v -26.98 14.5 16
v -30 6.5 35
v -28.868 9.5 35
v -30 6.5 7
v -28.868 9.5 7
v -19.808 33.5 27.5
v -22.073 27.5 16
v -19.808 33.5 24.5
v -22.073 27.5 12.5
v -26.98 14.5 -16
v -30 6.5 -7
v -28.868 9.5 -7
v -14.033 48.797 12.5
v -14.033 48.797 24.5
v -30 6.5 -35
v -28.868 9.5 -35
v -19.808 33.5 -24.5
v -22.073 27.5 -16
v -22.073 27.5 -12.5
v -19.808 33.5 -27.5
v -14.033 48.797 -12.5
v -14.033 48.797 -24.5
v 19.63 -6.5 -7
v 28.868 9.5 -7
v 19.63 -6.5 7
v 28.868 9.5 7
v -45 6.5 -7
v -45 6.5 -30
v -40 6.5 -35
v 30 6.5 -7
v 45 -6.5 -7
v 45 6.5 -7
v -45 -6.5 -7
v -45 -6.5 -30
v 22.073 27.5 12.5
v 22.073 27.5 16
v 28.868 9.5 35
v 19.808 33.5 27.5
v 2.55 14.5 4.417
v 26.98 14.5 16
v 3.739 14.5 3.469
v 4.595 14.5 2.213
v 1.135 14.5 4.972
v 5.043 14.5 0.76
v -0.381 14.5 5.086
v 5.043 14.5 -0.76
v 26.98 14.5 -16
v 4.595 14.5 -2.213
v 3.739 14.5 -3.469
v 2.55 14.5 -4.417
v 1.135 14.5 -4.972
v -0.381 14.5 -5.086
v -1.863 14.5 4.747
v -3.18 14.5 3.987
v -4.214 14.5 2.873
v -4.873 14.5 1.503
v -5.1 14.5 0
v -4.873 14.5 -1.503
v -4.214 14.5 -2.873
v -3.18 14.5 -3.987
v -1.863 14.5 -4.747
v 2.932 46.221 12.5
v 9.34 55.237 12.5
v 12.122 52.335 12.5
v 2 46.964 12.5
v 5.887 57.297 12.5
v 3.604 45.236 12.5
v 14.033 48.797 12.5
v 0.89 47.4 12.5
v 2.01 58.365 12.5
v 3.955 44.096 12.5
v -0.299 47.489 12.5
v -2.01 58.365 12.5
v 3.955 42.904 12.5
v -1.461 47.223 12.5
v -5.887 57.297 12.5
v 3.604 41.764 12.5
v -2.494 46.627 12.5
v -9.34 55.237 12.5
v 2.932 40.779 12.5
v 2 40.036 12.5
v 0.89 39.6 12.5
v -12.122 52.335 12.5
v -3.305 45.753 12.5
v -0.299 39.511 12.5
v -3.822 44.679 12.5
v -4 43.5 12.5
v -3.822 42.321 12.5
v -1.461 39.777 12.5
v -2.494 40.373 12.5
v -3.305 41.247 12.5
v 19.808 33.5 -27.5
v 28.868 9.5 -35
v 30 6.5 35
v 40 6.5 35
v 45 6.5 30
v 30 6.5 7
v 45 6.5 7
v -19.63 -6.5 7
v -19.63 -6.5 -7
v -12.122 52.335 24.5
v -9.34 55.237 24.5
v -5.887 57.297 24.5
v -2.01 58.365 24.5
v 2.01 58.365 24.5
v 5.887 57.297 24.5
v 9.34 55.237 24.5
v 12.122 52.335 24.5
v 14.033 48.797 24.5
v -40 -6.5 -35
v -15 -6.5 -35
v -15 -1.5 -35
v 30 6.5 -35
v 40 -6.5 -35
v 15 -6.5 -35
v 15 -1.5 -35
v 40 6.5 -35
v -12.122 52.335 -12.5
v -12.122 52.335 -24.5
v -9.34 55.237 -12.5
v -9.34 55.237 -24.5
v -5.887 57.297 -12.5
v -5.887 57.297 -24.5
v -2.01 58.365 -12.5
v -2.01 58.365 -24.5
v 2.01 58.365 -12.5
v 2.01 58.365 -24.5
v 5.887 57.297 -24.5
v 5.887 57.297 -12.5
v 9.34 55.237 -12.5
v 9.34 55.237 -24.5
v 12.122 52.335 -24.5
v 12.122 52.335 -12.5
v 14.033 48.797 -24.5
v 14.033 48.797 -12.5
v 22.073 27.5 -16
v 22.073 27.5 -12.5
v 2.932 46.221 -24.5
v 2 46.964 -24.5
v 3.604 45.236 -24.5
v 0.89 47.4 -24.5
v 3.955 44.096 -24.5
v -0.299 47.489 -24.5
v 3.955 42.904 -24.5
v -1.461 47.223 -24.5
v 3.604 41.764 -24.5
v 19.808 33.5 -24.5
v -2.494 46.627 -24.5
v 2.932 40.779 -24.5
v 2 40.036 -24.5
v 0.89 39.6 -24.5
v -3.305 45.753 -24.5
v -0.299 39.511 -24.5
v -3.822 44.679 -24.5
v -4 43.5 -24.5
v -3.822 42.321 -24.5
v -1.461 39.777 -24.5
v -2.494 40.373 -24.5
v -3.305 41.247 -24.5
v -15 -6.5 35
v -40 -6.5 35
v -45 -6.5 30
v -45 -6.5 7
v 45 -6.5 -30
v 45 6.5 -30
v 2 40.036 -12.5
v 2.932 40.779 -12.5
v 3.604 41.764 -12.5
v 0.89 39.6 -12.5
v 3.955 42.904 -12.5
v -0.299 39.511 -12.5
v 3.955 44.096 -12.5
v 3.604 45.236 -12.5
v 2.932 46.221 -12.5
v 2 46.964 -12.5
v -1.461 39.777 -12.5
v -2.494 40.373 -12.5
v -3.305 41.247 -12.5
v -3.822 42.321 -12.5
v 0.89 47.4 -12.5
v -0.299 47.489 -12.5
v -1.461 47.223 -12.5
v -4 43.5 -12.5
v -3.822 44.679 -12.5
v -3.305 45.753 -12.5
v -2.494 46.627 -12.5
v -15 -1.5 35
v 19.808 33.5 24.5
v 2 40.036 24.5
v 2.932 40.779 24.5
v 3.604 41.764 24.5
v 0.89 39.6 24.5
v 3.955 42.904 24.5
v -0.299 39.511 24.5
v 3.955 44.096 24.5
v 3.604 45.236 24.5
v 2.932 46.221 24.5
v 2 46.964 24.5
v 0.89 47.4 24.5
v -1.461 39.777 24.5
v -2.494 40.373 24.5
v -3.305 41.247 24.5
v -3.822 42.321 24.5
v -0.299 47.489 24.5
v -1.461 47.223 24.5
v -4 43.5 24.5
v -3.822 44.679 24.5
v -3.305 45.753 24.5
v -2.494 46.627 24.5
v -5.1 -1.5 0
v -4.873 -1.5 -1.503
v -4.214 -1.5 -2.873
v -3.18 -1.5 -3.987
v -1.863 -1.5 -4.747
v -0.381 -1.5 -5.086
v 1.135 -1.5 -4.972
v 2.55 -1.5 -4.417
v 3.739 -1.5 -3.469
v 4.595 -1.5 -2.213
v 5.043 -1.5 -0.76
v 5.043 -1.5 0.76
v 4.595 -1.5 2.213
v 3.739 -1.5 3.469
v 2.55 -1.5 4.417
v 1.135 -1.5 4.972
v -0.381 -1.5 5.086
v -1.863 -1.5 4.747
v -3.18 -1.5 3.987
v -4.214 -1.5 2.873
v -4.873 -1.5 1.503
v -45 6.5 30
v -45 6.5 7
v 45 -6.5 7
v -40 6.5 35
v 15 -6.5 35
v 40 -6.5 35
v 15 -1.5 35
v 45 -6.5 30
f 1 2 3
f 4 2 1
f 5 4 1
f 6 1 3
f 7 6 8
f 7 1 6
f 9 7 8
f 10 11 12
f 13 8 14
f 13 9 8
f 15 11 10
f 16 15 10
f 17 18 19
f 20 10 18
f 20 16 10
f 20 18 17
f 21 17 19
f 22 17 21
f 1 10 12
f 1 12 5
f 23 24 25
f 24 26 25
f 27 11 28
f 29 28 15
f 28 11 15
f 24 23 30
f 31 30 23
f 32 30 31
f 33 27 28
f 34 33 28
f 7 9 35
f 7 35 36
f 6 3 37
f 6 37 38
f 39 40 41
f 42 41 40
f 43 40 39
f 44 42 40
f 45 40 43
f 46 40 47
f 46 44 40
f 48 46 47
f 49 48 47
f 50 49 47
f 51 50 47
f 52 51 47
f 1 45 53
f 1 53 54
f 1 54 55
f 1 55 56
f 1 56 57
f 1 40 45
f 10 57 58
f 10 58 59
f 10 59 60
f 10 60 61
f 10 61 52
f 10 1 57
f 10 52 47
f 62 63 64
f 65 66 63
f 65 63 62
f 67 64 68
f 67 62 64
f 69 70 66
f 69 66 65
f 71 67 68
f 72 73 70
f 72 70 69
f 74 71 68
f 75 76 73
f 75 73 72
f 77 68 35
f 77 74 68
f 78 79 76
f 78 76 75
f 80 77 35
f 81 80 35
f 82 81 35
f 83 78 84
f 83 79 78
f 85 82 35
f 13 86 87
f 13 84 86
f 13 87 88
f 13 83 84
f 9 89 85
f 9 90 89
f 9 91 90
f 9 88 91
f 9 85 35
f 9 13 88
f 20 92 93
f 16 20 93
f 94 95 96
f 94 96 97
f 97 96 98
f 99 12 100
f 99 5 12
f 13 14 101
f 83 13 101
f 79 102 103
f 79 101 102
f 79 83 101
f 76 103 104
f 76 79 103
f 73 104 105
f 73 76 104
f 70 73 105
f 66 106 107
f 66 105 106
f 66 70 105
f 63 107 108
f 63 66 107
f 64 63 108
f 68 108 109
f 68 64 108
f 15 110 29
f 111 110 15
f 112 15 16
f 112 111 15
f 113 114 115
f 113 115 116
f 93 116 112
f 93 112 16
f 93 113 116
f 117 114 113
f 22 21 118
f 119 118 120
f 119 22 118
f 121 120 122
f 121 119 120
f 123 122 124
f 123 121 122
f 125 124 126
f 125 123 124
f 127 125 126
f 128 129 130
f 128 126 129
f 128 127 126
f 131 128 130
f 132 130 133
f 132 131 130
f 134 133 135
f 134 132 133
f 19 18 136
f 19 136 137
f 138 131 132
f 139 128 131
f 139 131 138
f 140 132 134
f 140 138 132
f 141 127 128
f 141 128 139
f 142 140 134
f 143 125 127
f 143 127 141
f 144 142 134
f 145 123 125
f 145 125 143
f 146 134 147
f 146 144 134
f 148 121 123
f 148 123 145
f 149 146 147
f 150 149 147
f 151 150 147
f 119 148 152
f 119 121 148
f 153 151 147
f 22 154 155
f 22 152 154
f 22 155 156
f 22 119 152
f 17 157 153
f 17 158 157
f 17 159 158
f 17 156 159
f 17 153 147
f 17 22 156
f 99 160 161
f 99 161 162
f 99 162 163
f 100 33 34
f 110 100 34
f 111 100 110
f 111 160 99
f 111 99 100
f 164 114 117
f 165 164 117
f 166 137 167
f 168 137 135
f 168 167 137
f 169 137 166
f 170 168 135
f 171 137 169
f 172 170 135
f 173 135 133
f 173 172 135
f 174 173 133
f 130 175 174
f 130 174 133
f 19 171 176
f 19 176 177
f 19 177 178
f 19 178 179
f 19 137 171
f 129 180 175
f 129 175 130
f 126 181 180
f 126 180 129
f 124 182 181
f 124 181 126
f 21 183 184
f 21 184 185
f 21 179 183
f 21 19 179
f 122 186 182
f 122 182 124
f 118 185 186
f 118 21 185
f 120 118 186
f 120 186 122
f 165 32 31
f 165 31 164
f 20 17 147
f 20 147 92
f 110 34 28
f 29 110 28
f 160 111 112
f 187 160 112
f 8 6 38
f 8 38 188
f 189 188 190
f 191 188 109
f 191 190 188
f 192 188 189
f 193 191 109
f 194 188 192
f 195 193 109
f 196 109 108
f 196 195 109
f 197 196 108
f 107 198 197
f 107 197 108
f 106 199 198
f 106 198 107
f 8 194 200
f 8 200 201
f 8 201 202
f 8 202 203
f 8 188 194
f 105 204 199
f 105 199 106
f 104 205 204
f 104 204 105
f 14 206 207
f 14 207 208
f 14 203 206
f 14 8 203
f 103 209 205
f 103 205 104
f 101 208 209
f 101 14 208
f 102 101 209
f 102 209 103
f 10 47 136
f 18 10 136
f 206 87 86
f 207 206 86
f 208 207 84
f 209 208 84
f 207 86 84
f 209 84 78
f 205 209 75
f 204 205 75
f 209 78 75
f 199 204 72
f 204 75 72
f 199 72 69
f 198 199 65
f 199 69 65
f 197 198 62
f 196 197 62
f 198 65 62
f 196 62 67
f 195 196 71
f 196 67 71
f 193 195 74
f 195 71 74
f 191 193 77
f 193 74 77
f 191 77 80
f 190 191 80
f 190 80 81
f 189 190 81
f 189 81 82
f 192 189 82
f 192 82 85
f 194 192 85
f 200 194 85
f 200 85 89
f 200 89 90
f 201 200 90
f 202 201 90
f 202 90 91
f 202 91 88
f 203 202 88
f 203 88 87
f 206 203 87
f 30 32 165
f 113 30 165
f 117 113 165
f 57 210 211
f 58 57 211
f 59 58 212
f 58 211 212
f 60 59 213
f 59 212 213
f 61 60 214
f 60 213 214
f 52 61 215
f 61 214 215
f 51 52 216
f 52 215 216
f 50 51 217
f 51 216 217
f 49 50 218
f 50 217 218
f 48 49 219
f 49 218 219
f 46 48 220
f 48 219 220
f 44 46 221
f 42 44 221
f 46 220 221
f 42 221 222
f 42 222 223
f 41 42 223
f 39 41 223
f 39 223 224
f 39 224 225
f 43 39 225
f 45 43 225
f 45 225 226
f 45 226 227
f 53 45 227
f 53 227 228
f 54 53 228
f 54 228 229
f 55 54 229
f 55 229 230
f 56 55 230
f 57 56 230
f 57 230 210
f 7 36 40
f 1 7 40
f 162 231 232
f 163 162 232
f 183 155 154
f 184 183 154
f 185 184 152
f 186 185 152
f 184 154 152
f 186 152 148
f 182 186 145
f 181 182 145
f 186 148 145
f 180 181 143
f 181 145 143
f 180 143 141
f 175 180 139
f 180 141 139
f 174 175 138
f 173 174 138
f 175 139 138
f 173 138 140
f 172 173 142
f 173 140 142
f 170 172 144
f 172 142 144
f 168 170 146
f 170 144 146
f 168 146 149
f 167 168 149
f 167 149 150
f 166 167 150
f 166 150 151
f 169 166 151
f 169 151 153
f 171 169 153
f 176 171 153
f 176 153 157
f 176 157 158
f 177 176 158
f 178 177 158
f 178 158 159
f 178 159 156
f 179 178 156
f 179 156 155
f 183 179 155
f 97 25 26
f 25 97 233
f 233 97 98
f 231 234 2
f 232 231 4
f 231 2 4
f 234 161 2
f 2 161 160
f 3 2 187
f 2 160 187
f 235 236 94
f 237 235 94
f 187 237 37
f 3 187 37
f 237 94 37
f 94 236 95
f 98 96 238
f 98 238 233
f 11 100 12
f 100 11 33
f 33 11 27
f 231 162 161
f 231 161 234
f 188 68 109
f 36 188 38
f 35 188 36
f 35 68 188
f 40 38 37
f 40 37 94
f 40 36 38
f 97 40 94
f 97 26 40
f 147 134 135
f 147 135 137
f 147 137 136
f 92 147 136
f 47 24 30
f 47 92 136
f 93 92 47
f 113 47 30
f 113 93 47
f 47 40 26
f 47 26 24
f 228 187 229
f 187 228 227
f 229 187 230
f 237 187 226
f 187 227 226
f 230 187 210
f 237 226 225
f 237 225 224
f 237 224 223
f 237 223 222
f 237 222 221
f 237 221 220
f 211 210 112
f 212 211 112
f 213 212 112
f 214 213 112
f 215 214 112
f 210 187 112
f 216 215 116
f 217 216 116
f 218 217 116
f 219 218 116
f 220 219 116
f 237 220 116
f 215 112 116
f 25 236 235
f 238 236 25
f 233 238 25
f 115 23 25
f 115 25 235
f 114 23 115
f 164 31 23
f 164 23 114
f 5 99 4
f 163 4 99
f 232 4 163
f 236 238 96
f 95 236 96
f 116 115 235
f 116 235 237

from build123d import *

# Parameters (mm, degrees)
SKETCH1_W                = 70
SKETCH1_H                = 13
BOSS_EXTRUDE1_DEPTH      = 45
CHAMFER1_SIZE            = 5
CUT_EXTRUDE1_DEPTH       = 58.378131723
CUT_EXTRUDE1_DEPTH_BACK  = 58.378131723
SKETCH3_W                = 30
SKETCH3_H                = 5
BOSS_EXTRUDE2_DEPTH      = 35
BOSS_EXTRUDE2_DEPTH_BACK = 35
CUT_EXTRUDE11_DEPTH      = 82.683841731
CUT_EXTRUDE11_DEPTH_BACK = 82.683841731
CUT_EXTRUDE12_DEPTH      = 7
F_8_0_8_DIAMETER_HOLE2_D = 8
M12_TAPPED_HOLE1_D       = 10.2


with BuildPart() as part:
    # Sketch1 → Boss-Extrude1 (new, symmetric)
    with BuildSketch(Plane(origin=(0, 0, 0), x_dir=(0, 0, -1), z_dir=(1, 0, 0))):
        Rectangle(SKETCH1_W, SKETCH1_H)
    extrude(amount=BOSS_EXTRUDE1_DEPTH, both=True)

    # Chamfer1
    chamfer1_edges = [part.edges().sort_by_distance(p)[0] for p in [
        (45, 0, -35),
        (45, 0, 35),
        (-45, 0, -35),
        (-45, 0, 35),
    ]]
    chamfer(chamfer1_edges, length=CHAMFER1_SIZE)

    # Sketch3 → Cut-Extrude1 (cut, two sides: drawn at the far end of the back side and taken through both)
    with BuildSketch(Plane.XY.offset(-CUT_EXTRUDE1_DEPTH_BACK)):
        with Locations((0, -4)):
            Rectangle(SKETCH3_W, SKETCH3_H)
    extrude(amount=CUT_EXTRUDE1_DEPTH + CUT_EXTRUDE1_DEPTH_BACK, mode=Mode.SUBTRACT)

    # Sketch4 → Boss-Extrude2 (add, two sides: drawn at the far end of the back side and taken through both)
    with BuildSketch(Plane.XY.offset(-BOSS_EXTRUDE2_DEPTH_BACK)):
        with BuildLine():
            Line((-30, 6.5), (-14.033447824, 48.797390128))
            ThreePointArc((-14.033447824, 48.797390128), (0, 58.5), (14.033447824, 48.797390128))
            Line((14.033447824, 48.797390128), (30, 6.5))
            Line((30, 6.5), (-30, 6.5))
        make_face()
    extrude(amount=BOSS_EXTRUDE2_DEPTH + BOSS_EXTRUDE2_DEPTH_BACK)

    # Sketch13 → Cut-Extrude11 (cut, two sides: drawn at the far end of the back side and taken through both)
    with BuildSketch(Plane(origin=(0, 0, 0), x_dir=(0, 0, -1), z_dir=(1, 0, 0)).offset(-CUT_EXTRUDE11_DEPTH_BACK)):
        Polygon((-88.955494026, -163.157580884), (-35, 9.5), (-27.5, 33.5), (-24.5, 33.5), (-24.5, 58.5), (-12.5, 58.5), (-12.5, 27.5), (-16, 27.5), (-16, 14.5), (16, 14.5), (16, 27.5), (12.5, 27.5), (12.5, 58.5), (24.5, 58.5), (24.5, 33.5), (27.5, 33.5), (35, 9.5), (88.955494026, -163.157580884), (88.955494026, 198.625976356), (-88.955494026, 198.625976356), align=None)
    extrude(amount=CUT_EXTRUDE11_DEPTH + CUT_EXTRUDE11_DEPTH_BACK, mode=Mode.SUBTRACT)

    # Sketch14 → Cut-Extrude12 (cut, symmetric)
    with BuildSketch(Plane.XY):
        Polygon((28.867550542, 9.5), (19.629946235, -6.5), (45, -6.5), (45, 6.5), (30, 6.5), align=None)
    cut_extrude12 = extrude(amount=CUT_EXTRUDE12_DEPTH, both=True, mode=Mode.SUBTRACT)

    # Mirror1: Cut-Extrude12 across plane
    add(cut_extrude12.mirror(Plane(origin=(0, 0, 0), x_dir=(0, 0, 1), z_dir=(1, 0, 0))), mode=Mode.SUBTRACT)

    # Ø8.0 (8) Diameter Hole2 (through all)
    with Locations(Plane.XY.offset(24.5)):
        with Locations((0, 43.5)):
            Hole(F_8_0_8_DIAMETER_HOLE2_D / 2)

    # M12 Tapped Hole1 (through all)
    with Locations(Plane(origin=(0, 14.5, 0), x_dir=(1, 0, 0), z_dir=(0, 1, 0))):
        with Locations((0, 0)):
            Hole(M12_TAPPED_HOLE1_D / 2)


solid = part.part
